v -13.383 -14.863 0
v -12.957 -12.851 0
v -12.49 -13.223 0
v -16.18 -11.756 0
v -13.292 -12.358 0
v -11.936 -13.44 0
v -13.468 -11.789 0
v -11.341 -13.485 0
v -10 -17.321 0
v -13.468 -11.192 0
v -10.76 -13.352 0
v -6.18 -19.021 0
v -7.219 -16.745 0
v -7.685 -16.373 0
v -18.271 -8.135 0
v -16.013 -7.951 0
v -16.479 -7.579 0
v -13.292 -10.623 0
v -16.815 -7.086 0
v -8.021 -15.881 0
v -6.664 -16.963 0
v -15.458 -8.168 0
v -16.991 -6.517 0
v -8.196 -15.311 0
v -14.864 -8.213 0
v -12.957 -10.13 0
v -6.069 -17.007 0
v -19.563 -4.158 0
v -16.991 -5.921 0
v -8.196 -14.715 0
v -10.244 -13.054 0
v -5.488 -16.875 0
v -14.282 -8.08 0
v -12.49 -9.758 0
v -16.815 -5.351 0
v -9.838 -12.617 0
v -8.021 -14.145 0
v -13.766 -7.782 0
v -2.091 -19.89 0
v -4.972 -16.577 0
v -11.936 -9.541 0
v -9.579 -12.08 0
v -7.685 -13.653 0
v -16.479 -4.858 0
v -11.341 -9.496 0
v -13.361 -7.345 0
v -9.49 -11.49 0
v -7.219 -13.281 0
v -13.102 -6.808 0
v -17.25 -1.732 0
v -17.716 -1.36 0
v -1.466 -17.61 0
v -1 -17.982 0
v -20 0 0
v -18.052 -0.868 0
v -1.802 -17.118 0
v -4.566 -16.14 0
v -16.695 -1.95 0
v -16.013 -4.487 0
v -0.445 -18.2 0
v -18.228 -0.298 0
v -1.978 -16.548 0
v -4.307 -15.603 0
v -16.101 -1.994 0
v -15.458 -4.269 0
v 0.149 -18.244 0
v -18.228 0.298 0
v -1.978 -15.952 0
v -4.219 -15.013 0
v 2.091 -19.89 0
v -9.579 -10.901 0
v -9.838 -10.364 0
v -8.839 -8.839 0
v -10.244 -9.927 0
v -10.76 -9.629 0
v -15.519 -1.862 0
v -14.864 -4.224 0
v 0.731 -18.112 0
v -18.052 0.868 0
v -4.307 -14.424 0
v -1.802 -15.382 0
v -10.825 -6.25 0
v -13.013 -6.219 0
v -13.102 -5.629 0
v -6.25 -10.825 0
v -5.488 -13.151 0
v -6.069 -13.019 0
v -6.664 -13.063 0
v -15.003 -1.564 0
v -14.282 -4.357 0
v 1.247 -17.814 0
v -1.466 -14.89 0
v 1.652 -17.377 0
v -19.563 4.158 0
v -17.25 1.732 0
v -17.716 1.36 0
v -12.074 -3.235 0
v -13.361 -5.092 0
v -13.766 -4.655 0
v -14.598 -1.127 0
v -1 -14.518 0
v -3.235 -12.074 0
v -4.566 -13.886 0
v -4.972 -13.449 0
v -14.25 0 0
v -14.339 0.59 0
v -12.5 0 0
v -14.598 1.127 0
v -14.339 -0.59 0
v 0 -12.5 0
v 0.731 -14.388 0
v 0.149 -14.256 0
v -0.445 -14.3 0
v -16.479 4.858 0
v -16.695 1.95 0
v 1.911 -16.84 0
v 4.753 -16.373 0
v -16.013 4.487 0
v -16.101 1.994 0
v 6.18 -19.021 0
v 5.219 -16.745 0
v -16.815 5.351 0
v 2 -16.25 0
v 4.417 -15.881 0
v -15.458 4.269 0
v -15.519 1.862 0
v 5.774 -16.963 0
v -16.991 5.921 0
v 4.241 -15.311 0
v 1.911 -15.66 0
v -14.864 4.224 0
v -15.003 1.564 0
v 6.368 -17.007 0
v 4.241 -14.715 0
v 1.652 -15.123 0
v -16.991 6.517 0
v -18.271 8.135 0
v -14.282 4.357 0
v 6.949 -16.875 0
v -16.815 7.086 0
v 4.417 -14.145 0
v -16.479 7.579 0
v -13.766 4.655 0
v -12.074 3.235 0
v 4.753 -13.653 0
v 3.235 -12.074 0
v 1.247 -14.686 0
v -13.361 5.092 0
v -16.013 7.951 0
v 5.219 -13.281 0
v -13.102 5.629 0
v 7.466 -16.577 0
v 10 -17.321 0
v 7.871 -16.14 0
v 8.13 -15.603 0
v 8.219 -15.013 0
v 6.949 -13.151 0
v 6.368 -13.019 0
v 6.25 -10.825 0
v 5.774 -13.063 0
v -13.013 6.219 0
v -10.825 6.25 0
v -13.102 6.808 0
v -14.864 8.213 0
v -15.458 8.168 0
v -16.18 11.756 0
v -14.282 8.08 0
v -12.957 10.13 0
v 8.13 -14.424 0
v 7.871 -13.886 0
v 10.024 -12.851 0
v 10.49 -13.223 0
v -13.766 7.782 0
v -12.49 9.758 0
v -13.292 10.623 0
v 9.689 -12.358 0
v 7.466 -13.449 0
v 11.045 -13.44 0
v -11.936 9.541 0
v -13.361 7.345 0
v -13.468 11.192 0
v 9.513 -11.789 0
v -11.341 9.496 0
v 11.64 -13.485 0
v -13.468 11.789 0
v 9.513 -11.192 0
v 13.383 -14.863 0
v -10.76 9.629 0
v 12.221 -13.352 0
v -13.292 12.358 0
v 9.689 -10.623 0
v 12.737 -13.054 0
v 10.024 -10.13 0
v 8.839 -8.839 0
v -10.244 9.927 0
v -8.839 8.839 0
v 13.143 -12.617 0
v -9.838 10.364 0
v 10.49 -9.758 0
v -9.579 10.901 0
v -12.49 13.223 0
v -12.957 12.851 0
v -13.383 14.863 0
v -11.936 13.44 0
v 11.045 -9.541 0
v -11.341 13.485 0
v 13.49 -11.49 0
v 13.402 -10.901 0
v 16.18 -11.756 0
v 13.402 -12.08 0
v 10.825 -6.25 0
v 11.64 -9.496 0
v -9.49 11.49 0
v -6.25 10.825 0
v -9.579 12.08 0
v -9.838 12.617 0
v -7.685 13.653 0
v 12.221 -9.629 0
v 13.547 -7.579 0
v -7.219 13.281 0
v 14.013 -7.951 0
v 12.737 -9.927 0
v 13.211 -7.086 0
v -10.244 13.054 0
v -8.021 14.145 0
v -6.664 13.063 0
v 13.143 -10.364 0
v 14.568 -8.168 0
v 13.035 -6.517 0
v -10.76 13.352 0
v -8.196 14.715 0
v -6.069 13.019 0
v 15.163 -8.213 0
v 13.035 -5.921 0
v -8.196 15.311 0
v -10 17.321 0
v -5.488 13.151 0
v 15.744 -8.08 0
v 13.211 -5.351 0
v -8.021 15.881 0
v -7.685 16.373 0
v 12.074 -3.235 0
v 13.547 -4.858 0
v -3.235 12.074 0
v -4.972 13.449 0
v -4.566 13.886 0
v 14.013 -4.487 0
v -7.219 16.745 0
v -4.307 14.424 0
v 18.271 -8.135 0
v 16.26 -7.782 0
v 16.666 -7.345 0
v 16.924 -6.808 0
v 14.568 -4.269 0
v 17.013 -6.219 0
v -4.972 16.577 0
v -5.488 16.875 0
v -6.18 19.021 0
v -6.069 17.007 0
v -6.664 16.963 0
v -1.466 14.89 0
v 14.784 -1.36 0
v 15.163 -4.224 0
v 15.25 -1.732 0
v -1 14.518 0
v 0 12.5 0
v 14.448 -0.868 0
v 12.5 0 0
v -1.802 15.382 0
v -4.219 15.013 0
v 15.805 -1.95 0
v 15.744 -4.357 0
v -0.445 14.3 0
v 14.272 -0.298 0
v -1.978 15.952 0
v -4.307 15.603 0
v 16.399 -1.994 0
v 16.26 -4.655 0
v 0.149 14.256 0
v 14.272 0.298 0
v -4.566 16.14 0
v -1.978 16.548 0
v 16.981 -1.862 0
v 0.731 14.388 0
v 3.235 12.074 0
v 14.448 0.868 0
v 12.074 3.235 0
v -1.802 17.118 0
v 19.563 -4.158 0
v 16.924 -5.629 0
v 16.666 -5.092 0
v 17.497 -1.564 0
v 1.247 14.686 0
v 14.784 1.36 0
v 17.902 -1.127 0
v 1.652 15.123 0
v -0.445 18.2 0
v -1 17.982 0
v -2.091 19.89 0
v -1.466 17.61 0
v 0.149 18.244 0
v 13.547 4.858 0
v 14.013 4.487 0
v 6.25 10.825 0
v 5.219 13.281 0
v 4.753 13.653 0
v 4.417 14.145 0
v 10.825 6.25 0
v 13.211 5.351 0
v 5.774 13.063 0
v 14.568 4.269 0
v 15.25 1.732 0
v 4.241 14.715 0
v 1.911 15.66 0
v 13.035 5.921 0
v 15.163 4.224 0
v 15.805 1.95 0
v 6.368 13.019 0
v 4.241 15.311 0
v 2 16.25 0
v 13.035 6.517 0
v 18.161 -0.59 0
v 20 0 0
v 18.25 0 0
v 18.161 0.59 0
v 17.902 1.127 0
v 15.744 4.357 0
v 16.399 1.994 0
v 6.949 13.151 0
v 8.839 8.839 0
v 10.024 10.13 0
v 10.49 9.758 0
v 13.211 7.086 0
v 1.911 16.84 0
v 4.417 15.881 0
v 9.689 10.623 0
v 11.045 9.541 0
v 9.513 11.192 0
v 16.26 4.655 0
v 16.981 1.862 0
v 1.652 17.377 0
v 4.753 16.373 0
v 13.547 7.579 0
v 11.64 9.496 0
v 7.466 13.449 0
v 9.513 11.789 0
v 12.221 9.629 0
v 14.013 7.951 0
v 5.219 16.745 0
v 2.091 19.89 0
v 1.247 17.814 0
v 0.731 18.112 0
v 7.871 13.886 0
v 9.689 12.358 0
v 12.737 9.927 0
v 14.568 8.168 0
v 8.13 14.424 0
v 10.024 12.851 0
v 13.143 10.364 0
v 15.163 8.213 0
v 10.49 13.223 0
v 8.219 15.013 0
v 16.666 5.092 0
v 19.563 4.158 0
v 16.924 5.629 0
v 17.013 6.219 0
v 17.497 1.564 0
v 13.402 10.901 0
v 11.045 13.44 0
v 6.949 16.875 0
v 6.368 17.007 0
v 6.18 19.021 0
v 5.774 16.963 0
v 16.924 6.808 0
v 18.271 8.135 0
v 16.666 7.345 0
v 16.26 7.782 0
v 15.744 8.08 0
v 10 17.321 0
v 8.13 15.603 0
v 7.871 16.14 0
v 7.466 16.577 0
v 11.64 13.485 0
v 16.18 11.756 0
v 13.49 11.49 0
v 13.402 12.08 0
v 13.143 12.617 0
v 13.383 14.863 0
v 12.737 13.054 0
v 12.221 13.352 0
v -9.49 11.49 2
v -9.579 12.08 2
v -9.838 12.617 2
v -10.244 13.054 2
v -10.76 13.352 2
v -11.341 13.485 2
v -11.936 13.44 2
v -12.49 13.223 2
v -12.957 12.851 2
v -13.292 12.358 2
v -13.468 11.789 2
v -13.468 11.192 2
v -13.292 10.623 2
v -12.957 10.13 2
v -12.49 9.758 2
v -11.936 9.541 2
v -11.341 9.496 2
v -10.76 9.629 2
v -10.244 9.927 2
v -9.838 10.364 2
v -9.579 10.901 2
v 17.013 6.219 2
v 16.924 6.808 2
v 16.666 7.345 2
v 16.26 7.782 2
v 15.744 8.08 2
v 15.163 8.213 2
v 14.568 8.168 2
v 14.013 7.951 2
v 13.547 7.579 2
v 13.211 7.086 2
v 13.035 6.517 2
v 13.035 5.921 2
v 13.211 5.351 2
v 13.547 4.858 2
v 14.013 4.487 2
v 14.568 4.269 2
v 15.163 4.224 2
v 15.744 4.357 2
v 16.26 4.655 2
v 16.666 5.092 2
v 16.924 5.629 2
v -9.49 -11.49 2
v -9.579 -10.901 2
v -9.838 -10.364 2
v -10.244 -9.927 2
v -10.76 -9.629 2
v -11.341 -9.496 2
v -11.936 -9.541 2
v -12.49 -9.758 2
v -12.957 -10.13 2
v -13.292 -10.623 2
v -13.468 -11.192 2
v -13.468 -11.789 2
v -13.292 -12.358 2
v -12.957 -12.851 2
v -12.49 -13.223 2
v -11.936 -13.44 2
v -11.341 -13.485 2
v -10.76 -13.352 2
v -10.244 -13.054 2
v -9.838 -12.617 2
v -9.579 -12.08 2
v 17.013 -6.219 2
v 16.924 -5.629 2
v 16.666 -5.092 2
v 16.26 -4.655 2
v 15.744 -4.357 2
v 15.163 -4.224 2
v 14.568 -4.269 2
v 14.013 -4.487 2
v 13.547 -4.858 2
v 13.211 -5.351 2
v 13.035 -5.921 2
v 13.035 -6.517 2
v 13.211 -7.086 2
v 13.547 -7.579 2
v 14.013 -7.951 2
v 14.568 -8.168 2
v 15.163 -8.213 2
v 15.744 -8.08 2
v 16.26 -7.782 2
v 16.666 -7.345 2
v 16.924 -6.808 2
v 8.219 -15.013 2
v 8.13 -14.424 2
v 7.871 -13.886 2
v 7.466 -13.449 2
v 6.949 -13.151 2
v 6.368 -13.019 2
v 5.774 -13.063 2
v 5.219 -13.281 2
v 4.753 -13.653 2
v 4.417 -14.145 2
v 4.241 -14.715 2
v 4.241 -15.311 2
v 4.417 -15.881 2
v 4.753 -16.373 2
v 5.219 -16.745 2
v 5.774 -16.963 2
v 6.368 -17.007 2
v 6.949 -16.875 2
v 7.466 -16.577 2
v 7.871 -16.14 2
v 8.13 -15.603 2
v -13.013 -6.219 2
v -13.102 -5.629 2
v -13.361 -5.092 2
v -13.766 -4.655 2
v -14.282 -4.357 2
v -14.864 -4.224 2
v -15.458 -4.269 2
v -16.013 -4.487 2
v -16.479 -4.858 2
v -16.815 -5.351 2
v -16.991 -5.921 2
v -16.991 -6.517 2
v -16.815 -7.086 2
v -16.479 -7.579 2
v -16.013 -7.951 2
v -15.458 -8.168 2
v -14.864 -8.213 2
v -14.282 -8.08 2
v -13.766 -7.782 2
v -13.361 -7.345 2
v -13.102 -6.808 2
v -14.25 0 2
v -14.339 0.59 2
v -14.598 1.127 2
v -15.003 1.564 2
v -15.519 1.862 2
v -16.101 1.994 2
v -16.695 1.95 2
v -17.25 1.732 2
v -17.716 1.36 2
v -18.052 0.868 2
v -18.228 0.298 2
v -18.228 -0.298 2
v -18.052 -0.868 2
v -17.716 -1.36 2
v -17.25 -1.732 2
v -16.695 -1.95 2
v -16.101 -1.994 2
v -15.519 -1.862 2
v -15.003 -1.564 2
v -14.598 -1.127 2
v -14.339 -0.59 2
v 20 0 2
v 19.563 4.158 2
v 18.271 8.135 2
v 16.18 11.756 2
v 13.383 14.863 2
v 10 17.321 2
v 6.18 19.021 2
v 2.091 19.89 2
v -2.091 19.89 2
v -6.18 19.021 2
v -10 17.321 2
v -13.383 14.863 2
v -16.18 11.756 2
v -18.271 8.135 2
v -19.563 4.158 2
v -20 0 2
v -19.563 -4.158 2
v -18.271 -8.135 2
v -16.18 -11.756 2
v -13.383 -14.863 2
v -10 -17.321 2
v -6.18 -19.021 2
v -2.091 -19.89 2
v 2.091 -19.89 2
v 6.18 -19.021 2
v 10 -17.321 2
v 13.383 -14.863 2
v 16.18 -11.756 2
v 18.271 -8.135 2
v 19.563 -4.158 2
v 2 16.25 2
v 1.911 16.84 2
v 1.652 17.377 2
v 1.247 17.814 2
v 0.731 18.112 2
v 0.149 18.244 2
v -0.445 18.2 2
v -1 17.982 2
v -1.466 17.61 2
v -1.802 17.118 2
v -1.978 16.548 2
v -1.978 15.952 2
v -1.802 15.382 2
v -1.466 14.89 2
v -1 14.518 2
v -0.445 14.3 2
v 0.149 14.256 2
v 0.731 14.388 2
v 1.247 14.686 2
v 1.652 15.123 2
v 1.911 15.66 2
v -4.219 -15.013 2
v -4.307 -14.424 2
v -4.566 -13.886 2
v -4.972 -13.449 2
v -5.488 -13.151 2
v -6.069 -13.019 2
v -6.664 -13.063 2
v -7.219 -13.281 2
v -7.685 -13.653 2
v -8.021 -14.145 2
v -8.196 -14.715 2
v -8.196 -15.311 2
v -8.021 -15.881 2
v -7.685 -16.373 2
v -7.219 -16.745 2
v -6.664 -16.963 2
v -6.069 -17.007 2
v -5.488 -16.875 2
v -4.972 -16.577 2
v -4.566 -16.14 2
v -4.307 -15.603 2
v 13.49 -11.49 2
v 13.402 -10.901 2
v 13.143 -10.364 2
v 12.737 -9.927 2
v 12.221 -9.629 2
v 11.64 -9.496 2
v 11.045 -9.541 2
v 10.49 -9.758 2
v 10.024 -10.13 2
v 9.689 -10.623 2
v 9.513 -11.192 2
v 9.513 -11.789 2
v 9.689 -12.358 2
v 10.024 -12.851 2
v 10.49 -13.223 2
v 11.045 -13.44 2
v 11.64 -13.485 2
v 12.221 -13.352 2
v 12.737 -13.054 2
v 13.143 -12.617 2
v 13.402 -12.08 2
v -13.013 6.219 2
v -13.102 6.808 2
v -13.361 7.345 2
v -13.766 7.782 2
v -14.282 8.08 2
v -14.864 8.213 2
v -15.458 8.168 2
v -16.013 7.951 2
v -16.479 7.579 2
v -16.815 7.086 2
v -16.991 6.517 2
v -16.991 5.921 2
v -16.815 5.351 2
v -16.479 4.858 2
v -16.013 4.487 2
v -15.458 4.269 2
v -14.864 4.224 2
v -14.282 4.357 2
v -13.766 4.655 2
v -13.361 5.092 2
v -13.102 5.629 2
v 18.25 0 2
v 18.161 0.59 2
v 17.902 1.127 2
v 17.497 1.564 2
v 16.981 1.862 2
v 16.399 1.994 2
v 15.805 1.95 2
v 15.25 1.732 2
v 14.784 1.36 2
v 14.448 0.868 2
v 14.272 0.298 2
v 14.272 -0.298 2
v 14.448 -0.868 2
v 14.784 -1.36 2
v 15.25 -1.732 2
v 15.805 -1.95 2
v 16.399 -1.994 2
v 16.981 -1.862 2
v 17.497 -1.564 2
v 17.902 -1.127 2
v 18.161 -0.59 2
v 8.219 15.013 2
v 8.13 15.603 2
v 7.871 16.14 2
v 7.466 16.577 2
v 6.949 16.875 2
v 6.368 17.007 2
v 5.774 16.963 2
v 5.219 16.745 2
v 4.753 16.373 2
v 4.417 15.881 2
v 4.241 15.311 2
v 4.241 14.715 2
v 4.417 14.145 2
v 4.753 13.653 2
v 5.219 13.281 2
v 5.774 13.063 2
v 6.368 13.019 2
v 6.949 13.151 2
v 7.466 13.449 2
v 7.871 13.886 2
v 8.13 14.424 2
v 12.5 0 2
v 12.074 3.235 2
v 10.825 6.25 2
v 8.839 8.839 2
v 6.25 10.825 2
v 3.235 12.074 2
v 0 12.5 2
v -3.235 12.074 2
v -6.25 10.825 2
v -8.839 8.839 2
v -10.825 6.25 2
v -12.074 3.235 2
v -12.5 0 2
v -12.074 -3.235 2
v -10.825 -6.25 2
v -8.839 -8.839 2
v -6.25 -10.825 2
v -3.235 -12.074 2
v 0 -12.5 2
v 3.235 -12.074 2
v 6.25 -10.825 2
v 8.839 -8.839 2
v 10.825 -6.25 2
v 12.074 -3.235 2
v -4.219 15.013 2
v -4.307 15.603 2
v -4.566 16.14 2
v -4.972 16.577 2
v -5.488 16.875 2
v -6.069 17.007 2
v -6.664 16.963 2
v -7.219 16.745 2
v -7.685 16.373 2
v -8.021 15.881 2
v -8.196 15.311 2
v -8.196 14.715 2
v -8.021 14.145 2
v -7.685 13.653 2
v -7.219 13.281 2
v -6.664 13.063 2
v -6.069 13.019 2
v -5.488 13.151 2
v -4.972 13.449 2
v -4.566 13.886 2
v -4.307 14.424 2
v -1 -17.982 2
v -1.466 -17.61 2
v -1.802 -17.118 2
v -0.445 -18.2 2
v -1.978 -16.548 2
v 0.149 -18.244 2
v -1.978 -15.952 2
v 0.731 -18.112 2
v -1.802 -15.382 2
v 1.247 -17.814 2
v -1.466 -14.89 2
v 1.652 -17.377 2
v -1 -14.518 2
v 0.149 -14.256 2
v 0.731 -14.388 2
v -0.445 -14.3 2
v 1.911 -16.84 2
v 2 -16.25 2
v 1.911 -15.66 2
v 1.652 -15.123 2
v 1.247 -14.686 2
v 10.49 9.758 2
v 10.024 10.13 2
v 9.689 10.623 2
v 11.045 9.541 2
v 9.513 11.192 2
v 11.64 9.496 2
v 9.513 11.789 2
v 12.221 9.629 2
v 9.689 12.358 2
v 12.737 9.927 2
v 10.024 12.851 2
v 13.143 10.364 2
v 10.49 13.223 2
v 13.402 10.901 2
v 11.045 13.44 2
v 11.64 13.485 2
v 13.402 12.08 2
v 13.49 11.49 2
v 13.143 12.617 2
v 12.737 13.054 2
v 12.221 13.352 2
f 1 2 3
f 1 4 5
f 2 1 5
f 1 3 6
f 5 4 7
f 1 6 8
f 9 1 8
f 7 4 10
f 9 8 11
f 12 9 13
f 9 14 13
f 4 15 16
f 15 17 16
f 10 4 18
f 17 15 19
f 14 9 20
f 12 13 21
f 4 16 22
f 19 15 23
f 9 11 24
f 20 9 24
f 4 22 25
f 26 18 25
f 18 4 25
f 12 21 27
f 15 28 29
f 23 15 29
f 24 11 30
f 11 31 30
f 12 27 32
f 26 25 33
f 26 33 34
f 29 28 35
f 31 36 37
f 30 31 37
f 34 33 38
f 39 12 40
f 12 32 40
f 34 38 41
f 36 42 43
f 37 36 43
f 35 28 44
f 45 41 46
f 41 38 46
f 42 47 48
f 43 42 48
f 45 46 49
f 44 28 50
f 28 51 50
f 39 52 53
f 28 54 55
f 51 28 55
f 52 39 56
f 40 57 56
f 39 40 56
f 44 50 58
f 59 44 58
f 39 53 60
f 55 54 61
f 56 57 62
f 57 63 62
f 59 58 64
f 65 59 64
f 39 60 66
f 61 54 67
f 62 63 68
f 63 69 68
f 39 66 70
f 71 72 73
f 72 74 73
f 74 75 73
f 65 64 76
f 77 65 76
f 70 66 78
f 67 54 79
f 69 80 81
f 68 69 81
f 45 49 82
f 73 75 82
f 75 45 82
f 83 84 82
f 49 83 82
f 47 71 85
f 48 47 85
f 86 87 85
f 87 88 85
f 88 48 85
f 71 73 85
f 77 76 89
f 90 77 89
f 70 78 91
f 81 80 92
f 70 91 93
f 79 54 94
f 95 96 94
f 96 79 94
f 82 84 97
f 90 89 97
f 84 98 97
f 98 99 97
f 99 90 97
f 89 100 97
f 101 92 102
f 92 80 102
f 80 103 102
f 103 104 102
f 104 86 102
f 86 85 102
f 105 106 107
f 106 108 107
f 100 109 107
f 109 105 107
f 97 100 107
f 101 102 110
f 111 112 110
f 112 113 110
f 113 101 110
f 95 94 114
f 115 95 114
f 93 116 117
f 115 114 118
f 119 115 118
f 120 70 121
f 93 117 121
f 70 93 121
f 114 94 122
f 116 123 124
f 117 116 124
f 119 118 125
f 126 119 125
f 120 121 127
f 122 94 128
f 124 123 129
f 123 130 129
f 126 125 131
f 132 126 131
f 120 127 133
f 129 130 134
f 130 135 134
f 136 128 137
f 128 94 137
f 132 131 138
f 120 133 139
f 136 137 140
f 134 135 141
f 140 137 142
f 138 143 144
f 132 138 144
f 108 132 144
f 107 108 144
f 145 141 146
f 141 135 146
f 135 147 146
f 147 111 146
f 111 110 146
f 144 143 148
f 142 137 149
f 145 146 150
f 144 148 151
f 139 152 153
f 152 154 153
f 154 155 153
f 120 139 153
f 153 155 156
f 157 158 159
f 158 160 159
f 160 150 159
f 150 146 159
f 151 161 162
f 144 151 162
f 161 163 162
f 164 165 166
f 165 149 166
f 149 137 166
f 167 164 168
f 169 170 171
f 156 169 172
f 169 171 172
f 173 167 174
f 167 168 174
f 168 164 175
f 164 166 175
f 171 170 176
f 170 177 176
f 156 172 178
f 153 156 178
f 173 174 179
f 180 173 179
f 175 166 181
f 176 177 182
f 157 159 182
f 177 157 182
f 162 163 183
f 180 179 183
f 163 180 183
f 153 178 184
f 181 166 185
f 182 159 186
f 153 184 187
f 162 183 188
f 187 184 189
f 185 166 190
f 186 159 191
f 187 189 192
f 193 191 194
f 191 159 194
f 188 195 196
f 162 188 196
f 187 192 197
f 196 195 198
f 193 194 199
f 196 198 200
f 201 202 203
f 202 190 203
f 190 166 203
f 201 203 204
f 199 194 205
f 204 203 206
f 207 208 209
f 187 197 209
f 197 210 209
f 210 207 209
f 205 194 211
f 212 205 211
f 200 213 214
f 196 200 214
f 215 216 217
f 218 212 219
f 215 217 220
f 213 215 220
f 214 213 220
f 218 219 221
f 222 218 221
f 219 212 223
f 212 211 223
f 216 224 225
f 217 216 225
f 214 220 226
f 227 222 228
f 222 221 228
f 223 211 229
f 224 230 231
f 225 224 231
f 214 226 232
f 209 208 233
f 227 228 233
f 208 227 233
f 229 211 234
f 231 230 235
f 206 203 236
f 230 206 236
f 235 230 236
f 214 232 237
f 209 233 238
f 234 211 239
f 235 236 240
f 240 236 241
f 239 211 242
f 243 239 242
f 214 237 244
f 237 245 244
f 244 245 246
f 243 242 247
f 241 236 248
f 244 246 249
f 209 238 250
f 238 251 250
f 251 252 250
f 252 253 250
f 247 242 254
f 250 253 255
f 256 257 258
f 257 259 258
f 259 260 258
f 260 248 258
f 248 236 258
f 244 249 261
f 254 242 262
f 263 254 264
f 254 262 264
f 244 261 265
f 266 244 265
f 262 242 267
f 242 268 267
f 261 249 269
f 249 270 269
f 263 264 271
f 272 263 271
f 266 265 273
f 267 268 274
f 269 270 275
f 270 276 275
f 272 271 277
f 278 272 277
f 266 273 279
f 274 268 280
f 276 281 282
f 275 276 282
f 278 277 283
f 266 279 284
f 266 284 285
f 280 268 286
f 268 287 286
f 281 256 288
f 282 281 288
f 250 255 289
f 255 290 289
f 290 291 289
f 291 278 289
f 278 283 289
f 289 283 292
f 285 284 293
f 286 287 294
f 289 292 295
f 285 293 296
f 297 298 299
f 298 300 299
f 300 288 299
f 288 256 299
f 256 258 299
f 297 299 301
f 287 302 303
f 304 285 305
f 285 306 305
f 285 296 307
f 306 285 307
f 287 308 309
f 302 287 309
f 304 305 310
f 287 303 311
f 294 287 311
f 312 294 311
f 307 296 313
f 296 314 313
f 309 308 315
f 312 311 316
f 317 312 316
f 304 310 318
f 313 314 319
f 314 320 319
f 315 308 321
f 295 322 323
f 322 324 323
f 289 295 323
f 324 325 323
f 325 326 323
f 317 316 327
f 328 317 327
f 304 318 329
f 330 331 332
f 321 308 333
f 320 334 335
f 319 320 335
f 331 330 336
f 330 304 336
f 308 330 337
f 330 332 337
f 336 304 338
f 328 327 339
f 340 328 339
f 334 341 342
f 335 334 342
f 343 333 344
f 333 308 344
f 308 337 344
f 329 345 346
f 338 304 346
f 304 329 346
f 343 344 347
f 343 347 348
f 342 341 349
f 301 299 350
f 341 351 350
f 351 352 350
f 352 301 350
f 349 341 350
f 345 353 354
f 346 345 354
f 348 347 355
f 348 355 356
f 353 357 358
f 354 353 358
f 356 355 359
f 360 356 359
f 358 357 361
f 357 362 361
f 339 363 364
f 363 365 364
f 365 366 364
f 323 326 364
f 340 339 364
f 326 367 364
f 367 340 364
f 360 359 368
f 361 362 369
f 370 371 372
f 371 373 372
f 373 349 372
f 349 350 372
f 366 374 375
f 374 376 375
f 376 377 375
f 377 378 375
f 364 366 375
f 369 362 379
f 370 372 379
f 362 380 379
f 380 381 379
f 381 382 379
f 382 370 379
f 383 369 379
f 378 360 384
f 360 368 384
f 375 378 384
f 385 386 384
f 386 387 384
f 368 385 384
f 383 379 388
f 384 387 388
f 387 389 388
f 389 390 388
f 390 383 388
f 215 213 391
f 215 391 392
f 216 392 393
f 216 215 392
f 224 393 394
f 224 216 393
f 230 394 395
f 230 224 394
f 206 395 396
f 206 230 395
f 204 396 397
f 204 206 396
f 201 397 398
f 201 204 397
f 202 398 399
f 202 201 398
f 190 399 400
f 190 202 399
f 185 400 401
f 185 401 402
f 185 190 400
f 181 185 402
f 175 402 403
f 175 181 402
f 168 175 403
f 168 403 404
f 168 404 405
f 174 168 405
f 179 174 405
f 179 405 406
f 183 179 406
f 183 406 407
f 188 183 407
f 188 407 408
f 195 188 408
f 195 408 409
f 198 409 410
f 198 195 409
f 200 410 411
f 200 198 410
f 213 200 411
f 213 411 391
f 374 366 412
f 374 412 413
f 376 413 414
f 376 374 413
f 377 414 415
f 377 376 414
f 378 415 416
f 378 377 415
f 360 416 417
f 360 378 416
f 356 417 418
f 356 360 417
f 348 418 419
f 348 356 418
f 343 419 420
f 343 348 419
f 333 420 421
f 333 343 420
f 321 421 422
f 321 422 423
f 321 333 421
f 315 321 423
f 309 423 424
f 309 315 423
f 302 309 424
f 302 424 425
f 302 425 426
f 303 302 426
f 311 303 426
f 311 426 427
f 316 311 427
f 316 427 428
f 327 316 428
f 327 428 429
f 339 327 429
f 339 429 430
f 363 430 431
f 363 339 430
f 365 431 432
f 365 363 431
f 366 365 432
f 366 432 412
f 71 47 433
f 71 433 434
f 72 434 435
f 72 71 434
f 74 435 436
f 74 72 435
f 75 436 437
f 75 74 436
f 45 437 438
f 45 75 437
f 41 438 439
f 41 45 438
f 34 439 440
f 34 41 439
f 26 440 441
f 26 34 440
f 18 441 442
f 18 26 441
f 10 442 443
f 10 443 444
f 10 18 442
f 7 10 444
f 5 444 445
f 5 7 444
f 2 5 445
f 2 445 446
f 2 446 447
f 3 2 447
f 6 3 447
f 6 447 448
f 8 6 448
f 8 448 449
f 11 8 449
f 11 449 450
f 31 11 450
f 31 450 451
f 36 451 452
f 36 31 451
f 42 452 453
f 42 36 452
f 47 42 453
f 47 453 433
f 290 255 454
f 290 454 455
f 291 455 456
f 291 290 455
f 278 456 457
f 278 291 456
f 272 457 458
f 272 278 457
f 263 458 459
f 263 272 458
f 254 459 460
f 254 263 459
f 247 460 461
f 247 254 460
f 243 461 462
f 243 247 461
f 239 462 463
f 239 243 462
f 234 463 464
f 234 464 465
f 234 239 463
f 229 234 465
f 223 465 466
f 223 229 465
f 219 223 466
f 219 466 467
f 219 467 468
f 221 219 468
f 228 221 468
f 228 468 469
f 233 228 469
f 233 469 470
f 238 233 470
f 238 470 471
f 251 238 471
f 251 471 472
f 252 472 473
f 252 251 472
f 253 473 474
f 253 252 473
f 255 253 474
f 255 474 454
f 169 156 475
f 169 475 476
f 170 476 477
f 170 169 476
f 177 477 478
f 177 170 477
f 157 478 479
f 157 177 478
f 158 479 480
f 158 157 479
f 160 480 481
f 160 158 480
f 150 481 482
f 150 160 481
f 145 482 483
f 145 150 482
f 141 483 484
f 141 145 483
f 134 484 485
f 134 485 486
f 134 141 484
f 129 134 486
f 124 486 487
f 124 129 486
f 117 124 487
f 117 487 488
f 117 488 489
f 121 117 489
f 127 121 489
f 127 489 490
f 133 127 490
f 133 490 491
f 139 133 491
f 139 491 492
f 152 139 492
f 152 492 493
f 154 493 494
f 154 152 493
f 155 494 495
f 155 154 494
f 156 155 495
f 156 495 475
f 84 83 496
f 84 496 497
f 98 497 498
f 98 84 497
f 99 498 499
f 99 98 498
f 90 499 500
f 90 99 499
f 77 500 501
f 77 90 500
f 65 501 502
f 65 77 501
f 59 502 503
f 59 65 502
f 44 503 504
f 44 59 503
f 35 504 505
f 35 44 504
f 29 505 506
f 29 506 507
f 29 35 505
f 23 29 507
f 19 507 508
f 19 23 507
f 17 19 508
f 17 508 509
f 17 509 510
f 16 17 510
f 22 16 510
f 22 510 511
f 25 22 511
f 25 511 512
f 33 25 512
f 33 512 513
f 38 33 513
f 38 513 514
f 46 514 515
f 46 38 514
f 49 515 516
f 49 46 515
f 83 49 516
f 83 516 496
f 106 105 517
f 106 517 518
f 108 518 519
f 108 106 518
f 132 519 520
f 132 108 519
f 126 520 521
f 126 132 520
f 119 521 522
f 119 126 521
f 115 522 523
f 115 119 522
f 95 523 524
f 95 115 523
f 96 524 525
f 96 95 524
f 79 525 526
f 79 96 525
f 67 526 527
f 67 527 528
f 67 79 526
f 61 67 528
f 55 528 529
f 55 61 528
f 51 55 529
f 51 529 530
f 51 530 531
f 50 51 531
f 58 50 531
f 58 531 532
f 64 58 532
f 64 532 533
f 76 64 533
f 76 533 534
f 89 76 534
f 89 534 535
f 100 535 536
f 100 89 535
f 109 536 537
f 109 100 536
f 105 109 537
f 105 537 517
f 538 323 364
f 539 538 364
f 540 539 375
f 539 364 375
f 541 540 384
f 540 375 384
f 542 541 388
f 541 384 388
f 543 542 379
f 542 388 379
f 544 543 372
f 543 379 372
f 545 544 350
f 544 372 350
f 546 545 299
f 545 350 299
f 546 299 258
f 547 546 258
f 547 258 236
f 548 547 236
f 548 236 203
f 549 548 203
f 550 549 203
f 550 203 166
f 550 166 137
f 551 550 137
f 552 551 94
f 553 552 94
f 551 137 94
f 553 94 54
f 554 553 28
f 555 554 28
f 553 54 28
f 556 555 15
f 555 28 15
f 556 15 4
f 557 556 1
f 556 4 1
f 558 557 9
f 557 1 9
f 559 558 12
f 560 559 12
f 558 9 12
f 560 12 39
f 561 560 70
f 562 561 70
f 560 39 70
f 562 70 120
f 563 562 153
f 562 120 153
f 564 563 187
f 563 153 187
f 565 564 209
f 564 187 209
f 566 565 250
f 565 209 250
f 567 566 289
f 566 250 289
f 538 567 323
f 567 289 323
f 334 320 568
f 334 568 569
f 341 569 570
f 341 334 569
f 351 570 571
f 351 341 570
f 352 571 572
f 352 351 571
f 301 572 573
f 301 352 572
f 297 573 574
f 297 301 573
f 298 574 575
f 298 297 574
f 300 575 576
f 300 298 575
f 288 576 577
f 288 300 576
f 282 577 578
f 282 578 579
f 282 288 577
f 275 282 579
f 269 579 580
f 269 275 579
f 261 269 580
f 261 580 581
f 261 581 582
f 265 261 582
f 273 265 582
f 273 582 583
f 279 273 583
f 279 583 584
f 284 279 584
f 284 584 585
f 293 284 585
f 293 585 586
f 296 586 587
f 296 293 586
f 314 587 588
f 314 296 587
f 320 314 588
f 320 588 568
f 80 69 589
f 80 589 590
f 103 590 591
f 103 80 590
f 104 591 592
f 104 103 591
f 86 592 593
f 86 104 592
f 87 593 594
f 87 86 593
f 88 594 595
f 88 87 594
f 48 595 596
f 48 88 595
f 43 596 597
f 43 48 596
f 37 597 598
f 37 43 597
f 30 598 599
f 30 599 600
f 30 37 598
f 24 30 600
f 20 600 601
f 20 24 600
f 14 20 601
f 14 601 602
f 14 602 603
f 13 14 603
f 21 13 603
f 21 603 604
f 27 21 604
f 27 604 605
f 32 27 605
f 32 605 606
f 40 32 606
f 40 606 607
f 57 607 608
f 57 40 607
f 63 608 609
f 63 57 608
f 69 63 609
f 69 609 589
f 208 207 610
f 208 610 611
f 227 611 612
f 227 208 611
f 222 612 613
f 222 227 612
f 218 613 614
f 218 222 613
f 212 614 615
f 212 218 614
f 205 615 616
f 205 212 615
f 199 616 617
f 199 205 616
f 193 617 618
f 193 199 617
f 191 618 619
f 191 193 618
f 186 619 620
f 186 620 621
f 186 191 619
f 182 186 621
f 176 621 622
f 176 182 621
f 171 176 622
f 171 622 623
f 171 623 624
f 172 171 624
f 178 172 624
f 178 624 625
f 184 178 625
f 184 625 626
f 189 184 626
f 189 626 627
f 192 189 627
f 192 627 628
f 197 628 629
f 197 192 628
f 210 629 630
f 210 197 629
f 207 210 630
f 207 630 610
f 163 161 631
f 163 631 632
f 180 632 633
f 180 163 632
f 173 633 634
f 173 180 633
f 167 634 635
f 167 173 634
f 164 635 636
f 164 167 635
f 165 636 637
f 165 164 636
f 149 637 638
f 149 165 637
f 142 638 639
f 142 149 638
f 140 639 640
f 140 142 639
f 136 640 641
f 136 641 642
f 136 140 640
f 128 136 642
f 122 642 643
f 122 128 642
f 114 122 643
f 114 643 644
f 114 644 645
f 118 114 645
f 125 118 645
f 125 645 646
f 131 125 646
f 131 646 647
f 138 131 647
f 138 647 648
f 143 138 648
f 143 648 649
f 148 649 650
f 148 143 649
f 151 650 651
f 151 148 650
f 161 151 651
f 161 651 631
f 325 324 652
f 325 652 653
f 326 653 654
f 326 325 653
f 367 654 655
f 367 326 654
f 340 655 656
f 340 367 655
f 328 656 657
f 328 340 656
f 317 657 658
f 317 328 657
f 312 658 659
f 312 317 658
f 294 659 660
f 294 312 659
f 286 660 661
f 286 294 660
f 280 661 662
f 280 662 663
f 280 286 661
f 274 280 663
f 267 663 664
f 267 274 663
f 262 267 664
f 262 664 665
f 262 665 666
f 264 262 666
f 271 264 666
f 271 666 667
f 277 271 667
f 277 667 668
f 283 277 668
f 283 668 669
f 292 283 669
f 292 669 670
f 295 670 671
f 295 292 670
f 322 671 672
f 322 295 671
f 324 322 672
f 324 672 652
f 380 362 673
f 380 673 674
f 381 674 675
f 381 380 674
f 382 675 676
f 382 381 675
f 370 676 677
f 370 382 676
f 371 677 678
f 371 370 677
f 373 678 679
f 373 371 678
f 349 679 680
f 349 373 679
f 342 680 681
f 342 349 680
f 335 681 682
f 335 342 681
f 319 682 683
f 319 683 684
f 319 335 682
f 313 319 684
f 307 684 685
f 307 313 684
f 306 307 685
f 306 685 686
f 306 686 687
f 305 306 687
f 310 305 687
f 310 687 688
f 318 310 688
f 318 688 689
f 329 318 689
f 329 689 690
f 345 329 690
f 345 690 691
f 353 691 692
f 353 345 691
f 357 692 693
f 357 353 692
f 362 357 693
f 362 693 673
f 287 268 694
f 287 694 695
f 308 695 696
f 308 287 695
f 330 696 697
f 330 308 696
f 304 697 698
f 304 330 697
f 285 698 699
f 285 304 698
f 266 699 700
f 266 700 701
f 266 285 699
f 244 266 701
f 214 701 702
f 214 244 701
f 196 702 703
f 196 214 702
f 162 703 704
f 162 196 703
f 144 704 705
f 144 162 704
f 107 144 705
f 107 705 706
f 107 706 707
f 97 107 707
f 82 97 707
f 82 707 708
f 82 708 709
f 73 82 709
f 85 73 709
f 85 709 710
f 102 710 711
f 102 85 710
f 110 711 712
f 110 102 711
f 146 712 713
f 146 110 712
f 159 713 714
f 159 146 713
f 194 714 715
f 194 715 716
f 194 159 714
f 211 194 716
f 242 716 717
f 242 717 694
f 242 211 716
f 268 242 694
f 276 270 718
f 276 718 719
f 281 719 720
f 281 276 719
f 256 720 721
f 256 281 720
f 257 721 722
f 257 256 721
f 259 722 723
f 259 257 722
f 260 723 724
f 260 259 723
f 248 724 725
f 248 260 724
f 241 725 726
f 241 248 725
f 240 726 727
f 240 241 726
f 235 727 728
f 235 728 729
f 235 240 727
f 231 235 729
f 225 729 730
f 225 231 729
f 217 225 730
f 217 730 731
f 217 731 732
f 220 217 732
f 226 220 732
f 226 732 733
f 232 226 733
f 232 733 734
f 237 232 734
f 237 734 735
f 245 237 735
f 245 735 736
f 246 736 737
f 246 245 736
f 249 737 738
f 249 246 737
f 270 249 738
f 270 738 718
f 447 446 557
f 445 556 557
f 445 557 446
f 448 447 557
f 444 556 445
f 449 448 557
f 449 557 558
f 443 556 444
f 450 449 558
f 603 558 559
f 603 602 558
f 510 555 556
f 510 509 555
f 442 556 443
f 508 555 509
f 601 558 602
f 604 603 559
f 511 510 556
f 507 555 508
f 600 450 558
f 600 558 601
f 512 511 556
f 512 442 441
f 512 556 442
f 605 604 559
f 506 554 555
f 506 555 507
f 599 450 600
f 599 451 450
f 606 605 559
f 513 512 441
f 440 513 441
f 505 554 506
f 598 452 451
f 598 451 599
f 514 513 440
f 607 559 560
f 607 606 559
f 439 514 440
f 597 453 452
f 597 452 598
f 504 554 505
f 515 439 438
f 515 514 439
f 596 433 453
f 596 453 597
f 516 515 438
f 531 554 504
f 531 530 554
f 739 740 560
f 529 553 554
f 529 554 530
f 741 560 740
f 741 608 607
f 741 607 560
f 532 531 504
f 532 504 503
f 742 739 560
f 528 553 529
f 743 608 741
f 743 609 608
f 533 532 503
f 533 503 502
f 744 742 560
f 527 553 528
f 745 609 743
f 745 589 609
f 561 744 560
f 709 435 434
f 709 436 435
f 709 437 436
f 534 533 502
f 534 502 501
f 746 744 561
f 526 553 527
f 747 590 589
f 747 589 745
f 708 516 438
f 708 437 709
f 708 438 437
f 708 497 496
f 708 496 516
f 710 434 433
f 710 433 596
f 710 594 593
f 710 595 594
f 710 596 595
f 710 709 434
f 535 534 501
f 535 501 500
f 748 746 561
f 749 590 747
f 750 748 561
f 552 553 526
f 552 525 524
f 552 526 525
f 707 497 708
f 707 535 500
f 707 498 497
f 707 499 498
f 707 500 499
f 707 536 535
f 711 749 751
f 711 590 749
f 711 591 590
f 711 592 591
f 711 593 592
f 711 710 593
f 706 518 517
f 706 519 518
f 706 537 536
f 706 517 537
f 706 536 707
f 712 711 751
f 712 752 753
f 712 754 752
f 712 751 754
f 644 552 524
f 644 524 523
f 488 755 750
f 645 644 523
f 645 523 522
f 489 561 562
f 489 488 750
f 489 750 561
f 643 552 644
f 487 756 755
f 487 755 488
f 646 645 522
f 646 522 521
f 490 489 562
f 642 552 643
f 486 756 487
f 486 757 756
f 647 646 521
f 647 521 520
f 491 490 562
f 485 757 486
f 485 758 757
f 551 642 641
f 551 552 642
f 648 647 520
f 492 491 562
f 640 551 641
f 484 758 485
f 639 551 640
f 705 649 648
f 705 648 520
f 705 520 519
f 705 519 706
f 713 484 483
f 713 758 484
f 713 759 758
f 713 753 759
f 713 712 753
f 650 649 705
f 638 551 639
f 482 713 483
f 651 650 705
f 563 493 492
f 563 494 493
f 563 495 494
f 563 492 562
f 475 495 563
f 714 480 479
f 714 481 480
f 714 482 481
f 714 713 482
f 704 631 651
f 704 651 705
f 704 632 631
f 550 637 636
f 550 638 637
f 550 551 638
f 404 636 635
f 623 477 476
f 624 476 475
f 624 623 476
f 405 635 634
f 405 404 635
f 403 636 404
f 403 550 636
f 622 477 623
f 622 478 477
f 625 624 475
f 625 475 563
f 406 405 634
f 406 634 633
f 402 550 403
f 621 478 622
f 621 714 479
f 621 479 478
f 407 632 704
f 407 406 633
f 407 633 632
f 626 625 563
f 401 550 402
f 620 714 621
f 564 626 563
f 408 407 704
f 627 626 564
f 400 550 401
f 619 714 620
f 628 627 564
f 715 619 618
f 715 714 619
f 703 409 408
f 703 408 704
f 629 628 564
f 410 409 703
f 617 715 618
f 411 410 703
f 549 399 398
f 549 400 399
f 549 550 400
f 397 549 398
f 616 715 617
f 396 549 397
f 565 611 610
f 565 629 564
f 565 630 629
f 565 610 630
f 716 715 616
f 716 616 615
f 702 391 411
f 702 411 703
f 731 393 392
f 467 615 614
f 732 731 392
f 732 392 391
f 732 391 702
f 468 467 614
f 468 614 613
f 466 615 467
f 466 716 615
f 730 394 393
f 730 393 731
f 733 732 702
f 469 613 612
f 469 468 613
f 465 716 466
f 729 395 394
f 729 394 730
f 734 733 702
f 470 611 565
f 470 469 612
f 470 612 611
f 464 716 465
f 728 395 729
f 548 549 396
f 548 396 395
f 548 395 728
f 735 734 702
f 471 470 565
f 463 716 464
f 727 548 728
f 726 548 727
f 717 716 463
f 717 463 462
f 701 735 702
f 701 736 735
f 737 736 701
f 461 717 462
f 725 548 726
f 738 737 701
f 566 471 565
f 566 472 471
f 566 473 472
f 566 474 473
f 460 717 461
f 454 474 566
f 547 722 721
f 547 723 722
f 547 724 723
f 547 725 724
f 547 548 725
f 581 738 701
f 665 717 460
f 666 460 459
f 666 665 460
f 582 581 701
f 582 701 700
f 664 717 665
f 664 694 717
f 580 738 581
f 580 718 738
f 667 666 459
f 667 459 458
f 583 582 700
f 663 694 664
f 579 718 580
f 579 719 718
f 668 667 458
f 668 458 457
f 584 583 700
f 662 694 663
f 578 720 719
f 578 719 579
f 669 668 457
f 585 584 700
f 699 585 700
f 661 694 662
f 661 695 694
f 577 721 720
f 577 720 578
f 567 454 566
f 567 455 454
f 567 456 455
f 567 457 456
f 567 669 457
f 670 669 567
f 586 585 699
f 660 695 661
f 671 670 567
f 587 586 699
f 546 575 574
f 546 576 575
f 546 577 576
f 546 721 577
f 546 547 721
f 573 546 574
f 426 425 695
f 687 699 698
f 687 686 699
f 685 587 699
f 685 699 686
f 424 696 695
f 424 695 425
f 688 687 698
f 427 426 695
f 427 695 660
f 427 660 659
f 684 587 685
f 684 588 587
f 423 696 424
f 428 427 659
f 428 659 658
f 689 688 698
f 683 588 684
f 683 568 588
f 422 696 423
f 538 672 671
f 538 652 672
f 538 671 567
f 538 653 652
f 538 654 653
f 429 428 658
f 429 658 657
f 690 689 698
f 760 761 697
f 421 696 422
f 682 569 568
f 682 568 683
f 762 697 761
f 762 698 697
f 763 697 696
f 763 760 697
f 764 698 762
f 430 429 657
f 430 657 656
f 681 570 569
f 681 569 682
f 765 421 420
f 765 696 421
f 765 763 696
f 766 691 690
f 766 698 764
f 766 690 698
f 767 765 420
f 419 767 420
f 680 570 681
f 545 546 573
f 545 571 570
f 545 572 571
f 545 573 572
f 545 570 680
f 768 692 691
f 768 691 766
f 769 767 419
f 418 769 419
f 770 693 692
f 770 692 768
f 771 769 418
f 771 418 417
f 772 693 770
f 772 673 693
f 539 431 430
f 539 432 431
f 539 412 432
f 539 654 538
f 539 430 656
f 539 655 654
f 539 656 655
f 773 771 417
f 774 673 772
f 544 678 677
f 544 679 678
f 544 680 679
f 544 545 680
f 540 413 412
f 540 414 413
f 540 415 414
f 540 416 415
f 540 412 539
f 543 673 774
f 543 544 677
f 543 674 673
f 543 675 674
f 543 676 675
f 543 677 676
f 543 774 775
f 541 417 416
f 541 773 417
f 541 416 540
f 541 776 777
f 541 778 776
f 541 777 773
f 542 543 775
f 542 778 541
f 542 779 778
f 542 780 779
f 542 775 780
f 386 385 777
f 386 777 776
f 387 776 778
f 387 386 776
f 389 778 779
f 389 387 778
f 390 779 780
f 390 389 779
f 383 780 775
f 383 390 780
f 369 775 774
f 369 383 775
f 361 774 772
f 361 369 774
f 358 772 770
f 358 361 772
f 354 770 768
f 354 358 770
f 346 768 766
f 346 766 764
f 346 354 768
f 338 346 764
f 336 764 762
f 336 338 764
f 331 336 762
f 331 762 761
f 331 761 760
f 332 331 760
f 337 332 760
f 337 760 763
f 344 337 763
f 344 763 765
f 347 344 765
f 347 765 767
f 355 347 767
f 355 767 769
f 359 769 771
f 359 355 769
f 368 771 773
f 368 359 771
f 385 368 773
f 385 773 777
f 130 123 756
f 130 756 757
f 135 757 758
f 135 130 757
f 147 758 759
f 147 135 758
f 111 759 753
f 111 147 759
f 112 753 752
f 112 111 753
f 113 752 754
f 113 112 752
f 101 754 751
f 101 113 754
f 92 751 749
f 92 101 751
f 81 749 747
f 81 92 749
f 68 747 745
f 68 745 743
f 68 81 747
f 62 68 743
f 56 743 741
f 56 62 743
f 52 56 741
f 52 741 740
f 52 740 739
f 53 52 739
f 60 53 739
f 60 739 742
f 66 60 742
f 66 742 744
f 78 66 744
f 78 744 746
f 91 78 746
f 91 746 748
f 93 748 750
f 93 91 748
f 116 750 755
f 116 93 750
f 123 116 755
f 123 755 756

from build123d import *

# Parameters (mm, degrees)
F0_R     = 20
F0_R_2   = 2
F0_R_3   = 12.5
F1_DEPTH = 2


with BuildPart() as f1:
    # F0 (on Top) → F1 (new body)
    with BuildSketch(Plane.XY):
        Circle(F0_R)
        with Locations((-11.490485, -11.490485)):
            Circle(F0_R_2, mode=Mode.SUBTRACT)
        with Locations((-6.218606, -15.013042)):
            Circle(F0_R_2, mode=Mode.SUBTRACT)
        with Locations((-15.013042, -6.218606)):
            Circle(F0_R_2, mode=Mode.SUBTRACT)
        with Locations((0, -16.25)):
            Circle(F0_R_2, mode=Mode.SUBTRACT)
        with Locations((6.218606, -15.013042)):
            Circle(F0_R_2, mode=Mode.SUBTRACT)
        with Locations((11.490485, -11.490485)):
            Circle(F0_R_2, mode=Mode.SUBTRACT)
        with Locations((15.013042, -6.218606)):
            Circle(F0_R_2, mode=Mode.SUBTRACT)
        with Locations((-16.25, 0)):
            Circle(F0_R_2, mode=Mode.SUBTRACT)
        with Locations((-15.013042, 6.218606)):
            Circle(F0_R_2, mode=Mode.SUBTRACT)
        with Locations((-11.490485, 11.490485)):
            Circle(F0_R_2, mode=Mode.SUBTRACT)
        with Locations((-6.218606, 15.013042)):
            Circle(F0_R_2, mode=Mode.SUBTRACT)
        Circle(F0_R_3, mode=Mode.SUBTRACT)
        with Locations((16.25, 0)):
            Circle(F0_R_2, mode=Mode.SUBTRACT)
        with Locations((15.013042, 6.218606)):
            Circle(F0_R_2, mode=Mode.SUBTRACT)
        with Locations((0, 16.25)):
            Circle(F0_R_2, mode=Mode.SUBTRACT)
        with Locations((6.218606, 15.013042)):
            Circle(F0_R_2, mode=Mode.SUBTRACT)
        with Locations((11.490485, 11.490485)):
            Circle(F0_R_2, mode=Mode.SUBTRACT)
    extrude(amount=F1_DEPTH)


solid = f1.part
